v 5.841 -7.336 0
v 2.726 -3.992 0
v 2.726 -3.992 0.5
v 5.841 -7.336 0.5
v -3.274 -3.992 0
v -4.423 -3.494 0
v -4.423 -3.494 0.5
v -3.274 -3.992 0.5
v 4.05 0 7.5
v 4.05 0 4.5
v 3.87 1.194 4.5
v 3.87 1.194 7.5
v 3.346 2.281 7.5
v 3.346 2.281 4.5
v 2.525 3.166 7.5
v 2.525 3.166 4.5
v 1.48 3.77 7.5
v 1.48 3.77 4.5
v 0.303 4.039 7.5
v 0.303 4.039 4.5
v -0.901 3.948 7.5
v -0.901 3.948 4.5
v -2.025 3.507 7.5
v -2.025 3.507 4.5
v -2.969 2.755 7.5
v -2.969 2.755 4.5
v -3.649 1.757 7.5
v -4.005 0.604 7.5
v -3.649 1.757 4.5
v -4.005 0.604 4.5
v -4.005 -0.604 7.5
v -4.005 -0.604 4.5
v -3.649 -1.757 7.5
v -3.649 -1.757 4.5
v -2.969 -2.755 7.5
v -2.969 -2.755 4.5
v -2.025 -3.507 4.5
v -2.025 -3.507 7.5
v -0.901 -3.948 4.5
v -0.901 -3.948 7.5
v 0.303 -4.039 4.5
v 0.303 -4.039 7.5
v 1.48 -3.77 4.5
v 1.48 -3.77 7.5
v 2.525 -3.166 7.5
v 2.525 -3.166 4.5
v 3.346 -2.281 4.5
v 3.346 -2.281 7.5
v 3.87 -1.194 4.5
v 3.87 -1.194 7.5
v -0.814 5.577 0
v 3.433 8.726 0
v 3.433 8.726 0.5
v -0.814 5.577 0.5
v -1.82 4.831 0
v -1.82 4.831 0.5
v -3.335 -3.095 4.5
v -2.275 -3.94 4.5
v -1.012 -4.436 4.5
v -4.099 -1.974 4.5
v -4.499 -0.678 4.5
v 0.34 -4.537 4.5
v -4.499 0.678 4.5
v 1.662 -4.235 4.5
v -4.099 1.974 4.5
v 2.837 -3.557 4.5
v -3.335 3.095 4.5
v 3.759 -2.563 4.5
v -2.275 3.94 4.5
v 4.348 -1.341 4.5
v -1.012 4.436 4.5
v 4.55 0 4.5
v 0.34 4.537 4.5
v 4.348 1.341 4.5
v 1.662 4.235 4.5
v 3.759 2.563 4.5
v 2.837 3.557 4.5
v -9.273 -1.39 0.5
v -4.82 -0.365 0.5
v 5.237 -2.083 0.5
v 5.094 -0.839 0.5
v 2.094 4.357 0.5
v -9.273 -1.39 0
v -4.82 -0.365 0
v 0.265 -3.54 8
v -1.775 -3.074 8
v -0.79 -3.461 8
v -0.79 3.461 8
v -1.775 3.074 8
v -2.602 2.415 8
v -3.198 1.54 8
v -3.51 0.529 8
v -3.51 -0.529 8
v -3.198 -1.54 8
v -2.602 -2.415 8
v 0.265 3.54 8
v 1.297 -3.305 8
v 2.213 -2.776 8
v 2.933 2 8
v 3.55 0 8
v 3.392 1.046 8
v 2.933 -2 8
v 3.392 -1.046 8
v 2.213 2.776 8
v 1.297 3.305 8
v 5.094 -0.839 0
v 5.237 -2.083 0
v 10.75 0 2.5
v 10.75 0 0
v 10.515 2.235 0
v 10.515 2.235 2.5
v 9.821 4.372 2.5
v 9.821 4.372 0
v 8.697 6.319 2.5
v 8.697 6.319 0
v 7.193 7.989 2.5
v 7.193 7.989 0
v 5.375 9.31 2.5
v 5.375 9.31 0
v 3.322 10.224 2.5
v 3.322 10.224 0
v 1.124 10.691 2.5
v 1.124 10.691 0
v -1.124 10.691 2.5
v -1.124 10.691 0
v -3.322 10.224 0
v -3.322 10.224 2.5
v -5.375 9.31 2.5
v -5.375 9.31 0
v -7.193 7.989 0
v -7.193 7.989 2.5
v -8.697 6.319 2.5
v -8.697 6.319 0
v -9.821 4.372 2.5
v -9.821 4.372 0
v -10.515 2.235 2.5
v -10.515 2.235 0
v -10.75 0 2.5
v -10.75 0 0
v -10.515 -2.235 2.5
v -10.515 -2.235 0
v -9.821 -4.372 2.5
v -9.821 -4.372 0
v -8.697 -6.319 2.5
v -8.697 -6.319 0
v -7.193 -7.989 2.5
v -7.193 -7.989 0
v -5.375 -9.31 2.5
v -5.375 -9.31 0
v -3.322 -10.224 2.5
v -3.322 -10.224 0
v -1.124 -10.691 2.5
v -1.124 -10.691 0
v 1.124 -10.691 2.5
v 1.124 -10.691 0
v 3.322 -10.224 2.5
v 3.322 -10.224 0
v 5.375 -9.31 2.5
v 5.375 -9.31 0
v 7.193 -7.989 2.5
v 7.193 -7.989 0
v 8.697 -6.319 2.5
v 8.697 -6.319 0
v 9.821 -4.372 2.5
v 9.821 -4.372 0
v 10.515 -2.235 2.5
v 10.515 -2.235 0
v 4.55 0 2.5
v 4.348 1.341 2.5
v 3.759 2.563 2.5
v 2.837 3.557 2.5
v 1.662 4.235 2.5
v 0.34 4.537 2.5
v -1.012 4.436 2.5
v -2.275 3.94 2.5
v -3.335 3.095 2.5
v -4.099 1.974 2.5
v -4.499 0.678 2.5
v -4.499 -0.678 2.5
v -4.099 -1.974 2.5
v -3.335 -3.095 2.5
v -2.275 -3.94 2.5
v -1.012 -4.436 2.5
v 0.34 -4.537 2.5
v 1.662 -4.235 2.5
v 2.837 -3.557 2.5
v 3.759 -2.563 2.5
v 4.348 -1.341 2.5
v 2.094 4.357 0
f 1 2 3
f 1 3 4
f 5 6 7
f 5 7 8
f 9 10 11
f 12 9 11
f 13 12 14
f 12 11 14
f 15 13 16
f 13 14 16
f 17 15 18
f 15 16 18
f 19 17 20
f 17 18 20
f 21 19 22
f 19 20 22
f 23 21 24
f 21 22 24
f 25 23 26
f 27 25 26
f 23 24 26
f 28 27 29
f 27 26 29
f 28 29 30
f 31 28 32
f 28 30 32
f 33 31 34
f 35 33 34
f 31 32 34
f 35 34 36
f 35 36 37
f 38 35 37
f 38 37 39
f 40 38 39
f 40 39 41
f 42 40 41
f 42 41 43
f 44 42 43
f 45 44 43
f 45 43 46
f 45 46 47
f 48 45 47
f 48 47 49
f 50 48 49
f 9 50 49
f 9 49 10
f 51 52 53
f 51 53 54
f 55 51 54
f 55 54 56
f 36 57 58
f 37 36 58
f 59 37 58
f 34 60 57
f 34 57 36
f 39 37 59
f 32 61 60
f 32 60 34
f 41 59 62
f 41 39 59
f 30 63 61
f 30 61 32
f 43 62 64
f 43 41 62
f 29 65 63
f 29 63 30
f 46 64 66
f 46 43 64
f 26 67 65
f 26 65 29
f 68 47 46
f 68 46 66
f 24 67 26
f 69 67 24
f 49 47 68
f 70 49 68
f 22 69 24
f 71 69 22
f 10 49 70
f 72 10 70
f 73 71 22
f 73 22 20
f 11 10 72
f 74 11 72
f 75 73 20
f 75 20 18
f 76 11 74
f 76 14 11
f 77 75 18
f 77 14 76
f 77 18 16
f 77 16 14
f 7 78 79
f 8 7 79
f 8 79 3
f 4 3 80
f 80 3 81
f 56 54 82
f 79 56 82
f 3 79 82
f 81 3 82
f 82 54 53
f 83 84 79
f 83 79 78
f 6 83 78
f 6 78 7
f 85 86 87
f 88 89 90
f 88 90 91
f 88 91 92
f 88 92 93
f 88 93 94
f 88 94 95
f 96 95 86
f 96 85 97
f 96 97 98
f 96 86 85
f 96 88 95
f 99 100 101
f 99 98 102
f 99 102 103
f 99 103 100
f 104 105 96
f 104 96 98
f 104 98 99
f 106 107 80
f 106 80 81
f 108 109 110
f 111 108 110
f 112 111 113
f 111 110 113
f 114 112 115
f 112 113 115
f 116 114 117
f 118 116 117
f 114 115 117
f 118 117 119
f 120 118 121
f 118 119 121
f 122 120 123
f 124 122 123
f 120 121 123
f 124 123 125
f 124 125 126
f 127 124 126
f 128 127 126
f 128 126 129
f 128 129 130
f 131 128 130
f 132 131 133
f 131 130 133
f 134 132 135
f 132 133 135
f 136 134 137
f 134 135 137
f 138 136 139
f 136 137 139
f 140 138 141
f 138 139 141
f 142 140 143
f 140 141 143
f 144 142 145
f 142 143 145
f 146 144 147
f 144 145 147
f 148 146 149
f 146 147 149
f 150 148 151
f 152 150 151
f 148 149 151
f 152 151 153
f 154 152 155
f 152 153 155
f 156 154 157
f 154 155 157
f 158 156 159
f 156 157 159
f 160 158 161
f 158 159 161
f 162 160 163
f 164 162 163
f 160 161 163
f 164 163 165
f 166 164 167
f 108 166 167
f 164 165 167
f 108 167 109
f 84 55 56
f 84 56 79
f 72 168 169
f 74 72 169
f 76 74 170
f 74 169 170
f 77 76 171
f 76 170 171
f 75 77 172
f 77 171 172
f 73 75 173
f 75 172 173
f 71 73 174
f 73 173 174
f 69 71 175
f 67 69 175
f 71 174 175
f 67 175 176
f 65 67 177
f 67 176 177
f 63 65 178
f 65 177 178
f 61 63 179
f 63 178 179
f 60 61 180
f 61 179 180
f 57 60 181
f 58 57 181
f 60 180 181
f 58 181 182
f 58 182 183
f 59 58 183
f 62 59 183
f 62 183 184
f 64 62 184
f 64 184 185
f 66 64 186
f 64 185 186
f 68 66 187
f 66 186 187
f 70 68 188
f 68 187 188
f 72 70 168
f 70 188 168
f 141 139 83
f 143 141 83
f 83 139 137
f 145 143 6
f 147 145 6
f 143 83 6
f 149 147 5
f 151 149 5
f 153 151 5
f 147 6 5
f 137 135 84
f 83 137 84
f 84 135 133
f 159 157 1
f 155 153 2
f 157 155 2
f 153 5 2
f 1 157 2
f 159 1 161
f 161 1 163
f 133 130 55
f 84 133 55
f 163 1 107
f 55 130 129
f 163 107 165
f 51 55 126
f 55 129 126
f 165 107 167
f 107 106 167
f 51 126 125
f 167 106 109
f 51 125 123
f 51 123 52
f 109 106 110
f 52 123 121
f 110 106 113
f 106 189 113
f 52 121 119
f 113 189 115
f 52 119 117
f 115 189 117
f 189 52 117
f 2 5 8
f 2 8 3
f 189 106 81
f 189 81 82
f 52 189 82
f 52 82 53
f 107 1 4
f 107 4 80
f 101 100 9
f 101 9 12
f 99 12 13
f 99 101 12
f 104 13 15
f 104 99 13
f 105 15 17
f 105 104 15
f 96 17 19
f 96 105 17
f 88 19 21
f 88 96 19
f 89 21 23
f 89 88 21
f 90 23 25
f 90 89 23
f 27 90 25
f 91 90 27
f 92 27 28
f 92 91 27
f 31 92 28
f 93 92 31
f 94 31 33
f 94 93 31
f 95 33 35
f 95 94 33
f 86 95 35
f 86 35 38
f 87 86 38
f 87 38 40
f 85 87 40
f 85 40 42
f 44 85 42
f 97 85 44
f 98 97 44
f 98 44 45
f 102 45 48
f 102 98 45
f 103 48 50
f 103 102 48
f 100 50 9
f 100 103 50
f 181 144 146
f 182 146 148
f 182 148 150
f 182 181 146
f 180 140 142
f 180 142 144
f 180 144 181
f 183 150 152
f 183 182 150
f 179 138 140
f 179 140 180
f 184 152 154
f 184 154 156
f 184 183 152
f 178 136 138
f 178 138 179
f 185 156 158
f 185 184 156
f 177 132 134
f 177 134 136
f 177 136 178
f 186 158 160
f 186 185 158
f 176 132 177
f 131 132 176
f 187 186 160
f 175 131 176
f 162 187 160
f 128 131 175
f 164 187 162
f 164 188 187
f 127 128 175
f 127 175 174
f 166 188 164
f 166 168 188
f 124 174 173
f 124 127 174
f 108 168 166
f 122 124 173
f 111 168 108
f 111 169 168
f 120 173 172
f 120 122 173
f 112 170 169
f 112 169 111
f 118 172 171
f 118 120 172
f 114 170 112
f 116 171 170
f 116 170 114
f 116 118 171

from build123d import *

# Parameters (mm, degrees)
F0_R     = 10.75
F0_R_2   = 10
F1_DEPTH = 2.5
F2_R     = 4.05
F3_DEPTH = 5.5
F4_SIZE  = 0.5
F5_R     = 4.55
F6_DEPTH = 2
F7_DEPTH = 0.5


# Not quite as in the source:
# - a feature names something its author has since deleted; it is built from what else it names


with BuildPart() as f1:
    # F0 (on Top) → F1 (new body)
    with BuildSketch(Plane.XY):
        Circle(F0_R)
        Circle(F0_R_2, mode=Mode.SUBTRACT)
        Circle(F0_R_2)
        Polygon((-0.8144098687, 5.5770273648), (3.432810713, 8.7260752933), (2.0940857055, 4.3571935282), (5.0940976108, -0.8390625077), (5.23705231, -2.0832140472), (5.8405975225, -7.3359389308), (2.7263974316, -3.992128183), (-3.2736025686, -3.992128183), (-4.4226424415, -3.4938133181), (-9.2734082358, -1.3901363628), (-4.8204831373, -0.3650653455), (-1.8204831373, 4.8310870772), align=None, mode=Mode.SUBTRACT)
        Polygon((2.0940857055, 4.3571935282), (3.432810713, 8.7260752933), (-0.8144098687, 5.5770273648), (-1.8204831373, 4.8310870772), (-4.8204831373, -0.3650653455), (-9.2734082358, -1.3901363628), (-4.4226424415, -3.4938133181), (-3.2736025686, -3.992128183), (2.7263974316, -3.992128183), (5.8405975225, -7.3359389308), (5.23705231, -2.0832140472), (5.0940976108, -0.8390625077), align=None)
    extrude(amount=F1_DEPTH)

    # F2 (on face) → F3 (join)
    with BuildSketch(Plane.XY.offset(2.5)):
        Circle(F2_R)
    extrude(amount=F3_DEPTH)

    # F4
    f4_edges = [f1.edges().sort_by_distance(p)[0] for p in [
        (-4.05, 0, 8),
    ]]
    chamfer(f4_edges, length=F4_SIZE)

    # F5 (on face) → F6 (join)
    with BuildSketch(Plane.XY.offset(2.5)):
        Circle(F5_R)
    extrude(amount=F6_DEPTH)

    # F0 (on Top) → F7 (cut)
    with BuildSketch(Plane.XY):
        Polygon((2.0940857055, 4.3571935282), (3.432810713, 8.7260752933), (-0.8144098687, 5.5770273648), (-1.8204831373, 4.8310870772), (-4.8204831373, -0.3650653455), (-9.2734082358, -1.3901363628), (-4.4226424415, -3.4938133181), (-3.2736025686, -3.992128183), (2.7263974316, -3.992128183), (5.8405975225, -7.3359389308), (5.23705231, -2.0832140472), (5.0940976108, -0.8390625077), align=None)
    extrude(amount=F7_DEPTH, mode=Mode.SUBTRACT)


solid = f1.part
